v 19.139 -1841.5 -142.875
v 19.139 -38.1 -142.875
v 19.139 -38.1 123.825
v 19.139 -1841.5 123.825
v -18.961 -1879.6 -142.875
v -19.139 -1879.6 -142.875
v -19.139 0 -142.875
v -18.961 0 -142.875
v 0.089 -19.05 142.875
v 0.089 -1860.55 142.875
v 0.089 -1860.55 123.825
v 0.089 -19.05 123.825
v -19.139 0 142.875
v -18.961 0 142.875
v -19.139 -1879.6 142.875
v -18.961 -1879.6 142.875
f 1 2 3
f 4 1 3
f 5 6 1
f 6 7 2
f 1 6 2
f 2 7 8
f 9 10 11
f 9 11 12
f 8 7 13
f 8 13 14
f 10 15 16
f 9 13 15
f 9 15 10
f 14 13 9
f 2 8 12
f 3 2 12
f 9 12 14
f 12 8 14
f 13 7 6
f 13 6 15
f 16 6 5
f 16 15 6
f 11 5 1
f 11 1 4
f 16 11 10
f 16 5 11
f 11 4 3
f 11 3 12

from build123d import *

# Parameters (mm, degrees)
F0_W     = 38.277834
F0_H     = 285.75
F1_DEPTH = 1879.6
F2_SIZE  = 38.1
F3_W     = 1841.5
F3_H     = 19.05
F4_DEPTH = 19.05


with BuildPart() as f1:
    # F0 (on Front) → F1 (new body)
    with BuildSketch(Plane.XZ):
        Rectangle(F0_W, F0_H)
    extrude(amount=F1_DEPTH)

    # F2
    f2_edges = [f1.edges().sort_by_distance(p)[0] for p in [
        (19.138917, -1879.6, 0),
        (19.138917, 0, 0),
    ]]
    chamfer(f2_edges, length=F2_SIZE)

    # F3 (on face) → F4 (cut)
    with BuildSketch(Plane.YZ.offset(19.138917)):
        with Locations((-939.8, 133.35)):
            Rectangle(F3_W, F3_H)
    extrude(amount=-F4_DEPTH, mode=Mode.SUBTRACT)


solid = f1.part
